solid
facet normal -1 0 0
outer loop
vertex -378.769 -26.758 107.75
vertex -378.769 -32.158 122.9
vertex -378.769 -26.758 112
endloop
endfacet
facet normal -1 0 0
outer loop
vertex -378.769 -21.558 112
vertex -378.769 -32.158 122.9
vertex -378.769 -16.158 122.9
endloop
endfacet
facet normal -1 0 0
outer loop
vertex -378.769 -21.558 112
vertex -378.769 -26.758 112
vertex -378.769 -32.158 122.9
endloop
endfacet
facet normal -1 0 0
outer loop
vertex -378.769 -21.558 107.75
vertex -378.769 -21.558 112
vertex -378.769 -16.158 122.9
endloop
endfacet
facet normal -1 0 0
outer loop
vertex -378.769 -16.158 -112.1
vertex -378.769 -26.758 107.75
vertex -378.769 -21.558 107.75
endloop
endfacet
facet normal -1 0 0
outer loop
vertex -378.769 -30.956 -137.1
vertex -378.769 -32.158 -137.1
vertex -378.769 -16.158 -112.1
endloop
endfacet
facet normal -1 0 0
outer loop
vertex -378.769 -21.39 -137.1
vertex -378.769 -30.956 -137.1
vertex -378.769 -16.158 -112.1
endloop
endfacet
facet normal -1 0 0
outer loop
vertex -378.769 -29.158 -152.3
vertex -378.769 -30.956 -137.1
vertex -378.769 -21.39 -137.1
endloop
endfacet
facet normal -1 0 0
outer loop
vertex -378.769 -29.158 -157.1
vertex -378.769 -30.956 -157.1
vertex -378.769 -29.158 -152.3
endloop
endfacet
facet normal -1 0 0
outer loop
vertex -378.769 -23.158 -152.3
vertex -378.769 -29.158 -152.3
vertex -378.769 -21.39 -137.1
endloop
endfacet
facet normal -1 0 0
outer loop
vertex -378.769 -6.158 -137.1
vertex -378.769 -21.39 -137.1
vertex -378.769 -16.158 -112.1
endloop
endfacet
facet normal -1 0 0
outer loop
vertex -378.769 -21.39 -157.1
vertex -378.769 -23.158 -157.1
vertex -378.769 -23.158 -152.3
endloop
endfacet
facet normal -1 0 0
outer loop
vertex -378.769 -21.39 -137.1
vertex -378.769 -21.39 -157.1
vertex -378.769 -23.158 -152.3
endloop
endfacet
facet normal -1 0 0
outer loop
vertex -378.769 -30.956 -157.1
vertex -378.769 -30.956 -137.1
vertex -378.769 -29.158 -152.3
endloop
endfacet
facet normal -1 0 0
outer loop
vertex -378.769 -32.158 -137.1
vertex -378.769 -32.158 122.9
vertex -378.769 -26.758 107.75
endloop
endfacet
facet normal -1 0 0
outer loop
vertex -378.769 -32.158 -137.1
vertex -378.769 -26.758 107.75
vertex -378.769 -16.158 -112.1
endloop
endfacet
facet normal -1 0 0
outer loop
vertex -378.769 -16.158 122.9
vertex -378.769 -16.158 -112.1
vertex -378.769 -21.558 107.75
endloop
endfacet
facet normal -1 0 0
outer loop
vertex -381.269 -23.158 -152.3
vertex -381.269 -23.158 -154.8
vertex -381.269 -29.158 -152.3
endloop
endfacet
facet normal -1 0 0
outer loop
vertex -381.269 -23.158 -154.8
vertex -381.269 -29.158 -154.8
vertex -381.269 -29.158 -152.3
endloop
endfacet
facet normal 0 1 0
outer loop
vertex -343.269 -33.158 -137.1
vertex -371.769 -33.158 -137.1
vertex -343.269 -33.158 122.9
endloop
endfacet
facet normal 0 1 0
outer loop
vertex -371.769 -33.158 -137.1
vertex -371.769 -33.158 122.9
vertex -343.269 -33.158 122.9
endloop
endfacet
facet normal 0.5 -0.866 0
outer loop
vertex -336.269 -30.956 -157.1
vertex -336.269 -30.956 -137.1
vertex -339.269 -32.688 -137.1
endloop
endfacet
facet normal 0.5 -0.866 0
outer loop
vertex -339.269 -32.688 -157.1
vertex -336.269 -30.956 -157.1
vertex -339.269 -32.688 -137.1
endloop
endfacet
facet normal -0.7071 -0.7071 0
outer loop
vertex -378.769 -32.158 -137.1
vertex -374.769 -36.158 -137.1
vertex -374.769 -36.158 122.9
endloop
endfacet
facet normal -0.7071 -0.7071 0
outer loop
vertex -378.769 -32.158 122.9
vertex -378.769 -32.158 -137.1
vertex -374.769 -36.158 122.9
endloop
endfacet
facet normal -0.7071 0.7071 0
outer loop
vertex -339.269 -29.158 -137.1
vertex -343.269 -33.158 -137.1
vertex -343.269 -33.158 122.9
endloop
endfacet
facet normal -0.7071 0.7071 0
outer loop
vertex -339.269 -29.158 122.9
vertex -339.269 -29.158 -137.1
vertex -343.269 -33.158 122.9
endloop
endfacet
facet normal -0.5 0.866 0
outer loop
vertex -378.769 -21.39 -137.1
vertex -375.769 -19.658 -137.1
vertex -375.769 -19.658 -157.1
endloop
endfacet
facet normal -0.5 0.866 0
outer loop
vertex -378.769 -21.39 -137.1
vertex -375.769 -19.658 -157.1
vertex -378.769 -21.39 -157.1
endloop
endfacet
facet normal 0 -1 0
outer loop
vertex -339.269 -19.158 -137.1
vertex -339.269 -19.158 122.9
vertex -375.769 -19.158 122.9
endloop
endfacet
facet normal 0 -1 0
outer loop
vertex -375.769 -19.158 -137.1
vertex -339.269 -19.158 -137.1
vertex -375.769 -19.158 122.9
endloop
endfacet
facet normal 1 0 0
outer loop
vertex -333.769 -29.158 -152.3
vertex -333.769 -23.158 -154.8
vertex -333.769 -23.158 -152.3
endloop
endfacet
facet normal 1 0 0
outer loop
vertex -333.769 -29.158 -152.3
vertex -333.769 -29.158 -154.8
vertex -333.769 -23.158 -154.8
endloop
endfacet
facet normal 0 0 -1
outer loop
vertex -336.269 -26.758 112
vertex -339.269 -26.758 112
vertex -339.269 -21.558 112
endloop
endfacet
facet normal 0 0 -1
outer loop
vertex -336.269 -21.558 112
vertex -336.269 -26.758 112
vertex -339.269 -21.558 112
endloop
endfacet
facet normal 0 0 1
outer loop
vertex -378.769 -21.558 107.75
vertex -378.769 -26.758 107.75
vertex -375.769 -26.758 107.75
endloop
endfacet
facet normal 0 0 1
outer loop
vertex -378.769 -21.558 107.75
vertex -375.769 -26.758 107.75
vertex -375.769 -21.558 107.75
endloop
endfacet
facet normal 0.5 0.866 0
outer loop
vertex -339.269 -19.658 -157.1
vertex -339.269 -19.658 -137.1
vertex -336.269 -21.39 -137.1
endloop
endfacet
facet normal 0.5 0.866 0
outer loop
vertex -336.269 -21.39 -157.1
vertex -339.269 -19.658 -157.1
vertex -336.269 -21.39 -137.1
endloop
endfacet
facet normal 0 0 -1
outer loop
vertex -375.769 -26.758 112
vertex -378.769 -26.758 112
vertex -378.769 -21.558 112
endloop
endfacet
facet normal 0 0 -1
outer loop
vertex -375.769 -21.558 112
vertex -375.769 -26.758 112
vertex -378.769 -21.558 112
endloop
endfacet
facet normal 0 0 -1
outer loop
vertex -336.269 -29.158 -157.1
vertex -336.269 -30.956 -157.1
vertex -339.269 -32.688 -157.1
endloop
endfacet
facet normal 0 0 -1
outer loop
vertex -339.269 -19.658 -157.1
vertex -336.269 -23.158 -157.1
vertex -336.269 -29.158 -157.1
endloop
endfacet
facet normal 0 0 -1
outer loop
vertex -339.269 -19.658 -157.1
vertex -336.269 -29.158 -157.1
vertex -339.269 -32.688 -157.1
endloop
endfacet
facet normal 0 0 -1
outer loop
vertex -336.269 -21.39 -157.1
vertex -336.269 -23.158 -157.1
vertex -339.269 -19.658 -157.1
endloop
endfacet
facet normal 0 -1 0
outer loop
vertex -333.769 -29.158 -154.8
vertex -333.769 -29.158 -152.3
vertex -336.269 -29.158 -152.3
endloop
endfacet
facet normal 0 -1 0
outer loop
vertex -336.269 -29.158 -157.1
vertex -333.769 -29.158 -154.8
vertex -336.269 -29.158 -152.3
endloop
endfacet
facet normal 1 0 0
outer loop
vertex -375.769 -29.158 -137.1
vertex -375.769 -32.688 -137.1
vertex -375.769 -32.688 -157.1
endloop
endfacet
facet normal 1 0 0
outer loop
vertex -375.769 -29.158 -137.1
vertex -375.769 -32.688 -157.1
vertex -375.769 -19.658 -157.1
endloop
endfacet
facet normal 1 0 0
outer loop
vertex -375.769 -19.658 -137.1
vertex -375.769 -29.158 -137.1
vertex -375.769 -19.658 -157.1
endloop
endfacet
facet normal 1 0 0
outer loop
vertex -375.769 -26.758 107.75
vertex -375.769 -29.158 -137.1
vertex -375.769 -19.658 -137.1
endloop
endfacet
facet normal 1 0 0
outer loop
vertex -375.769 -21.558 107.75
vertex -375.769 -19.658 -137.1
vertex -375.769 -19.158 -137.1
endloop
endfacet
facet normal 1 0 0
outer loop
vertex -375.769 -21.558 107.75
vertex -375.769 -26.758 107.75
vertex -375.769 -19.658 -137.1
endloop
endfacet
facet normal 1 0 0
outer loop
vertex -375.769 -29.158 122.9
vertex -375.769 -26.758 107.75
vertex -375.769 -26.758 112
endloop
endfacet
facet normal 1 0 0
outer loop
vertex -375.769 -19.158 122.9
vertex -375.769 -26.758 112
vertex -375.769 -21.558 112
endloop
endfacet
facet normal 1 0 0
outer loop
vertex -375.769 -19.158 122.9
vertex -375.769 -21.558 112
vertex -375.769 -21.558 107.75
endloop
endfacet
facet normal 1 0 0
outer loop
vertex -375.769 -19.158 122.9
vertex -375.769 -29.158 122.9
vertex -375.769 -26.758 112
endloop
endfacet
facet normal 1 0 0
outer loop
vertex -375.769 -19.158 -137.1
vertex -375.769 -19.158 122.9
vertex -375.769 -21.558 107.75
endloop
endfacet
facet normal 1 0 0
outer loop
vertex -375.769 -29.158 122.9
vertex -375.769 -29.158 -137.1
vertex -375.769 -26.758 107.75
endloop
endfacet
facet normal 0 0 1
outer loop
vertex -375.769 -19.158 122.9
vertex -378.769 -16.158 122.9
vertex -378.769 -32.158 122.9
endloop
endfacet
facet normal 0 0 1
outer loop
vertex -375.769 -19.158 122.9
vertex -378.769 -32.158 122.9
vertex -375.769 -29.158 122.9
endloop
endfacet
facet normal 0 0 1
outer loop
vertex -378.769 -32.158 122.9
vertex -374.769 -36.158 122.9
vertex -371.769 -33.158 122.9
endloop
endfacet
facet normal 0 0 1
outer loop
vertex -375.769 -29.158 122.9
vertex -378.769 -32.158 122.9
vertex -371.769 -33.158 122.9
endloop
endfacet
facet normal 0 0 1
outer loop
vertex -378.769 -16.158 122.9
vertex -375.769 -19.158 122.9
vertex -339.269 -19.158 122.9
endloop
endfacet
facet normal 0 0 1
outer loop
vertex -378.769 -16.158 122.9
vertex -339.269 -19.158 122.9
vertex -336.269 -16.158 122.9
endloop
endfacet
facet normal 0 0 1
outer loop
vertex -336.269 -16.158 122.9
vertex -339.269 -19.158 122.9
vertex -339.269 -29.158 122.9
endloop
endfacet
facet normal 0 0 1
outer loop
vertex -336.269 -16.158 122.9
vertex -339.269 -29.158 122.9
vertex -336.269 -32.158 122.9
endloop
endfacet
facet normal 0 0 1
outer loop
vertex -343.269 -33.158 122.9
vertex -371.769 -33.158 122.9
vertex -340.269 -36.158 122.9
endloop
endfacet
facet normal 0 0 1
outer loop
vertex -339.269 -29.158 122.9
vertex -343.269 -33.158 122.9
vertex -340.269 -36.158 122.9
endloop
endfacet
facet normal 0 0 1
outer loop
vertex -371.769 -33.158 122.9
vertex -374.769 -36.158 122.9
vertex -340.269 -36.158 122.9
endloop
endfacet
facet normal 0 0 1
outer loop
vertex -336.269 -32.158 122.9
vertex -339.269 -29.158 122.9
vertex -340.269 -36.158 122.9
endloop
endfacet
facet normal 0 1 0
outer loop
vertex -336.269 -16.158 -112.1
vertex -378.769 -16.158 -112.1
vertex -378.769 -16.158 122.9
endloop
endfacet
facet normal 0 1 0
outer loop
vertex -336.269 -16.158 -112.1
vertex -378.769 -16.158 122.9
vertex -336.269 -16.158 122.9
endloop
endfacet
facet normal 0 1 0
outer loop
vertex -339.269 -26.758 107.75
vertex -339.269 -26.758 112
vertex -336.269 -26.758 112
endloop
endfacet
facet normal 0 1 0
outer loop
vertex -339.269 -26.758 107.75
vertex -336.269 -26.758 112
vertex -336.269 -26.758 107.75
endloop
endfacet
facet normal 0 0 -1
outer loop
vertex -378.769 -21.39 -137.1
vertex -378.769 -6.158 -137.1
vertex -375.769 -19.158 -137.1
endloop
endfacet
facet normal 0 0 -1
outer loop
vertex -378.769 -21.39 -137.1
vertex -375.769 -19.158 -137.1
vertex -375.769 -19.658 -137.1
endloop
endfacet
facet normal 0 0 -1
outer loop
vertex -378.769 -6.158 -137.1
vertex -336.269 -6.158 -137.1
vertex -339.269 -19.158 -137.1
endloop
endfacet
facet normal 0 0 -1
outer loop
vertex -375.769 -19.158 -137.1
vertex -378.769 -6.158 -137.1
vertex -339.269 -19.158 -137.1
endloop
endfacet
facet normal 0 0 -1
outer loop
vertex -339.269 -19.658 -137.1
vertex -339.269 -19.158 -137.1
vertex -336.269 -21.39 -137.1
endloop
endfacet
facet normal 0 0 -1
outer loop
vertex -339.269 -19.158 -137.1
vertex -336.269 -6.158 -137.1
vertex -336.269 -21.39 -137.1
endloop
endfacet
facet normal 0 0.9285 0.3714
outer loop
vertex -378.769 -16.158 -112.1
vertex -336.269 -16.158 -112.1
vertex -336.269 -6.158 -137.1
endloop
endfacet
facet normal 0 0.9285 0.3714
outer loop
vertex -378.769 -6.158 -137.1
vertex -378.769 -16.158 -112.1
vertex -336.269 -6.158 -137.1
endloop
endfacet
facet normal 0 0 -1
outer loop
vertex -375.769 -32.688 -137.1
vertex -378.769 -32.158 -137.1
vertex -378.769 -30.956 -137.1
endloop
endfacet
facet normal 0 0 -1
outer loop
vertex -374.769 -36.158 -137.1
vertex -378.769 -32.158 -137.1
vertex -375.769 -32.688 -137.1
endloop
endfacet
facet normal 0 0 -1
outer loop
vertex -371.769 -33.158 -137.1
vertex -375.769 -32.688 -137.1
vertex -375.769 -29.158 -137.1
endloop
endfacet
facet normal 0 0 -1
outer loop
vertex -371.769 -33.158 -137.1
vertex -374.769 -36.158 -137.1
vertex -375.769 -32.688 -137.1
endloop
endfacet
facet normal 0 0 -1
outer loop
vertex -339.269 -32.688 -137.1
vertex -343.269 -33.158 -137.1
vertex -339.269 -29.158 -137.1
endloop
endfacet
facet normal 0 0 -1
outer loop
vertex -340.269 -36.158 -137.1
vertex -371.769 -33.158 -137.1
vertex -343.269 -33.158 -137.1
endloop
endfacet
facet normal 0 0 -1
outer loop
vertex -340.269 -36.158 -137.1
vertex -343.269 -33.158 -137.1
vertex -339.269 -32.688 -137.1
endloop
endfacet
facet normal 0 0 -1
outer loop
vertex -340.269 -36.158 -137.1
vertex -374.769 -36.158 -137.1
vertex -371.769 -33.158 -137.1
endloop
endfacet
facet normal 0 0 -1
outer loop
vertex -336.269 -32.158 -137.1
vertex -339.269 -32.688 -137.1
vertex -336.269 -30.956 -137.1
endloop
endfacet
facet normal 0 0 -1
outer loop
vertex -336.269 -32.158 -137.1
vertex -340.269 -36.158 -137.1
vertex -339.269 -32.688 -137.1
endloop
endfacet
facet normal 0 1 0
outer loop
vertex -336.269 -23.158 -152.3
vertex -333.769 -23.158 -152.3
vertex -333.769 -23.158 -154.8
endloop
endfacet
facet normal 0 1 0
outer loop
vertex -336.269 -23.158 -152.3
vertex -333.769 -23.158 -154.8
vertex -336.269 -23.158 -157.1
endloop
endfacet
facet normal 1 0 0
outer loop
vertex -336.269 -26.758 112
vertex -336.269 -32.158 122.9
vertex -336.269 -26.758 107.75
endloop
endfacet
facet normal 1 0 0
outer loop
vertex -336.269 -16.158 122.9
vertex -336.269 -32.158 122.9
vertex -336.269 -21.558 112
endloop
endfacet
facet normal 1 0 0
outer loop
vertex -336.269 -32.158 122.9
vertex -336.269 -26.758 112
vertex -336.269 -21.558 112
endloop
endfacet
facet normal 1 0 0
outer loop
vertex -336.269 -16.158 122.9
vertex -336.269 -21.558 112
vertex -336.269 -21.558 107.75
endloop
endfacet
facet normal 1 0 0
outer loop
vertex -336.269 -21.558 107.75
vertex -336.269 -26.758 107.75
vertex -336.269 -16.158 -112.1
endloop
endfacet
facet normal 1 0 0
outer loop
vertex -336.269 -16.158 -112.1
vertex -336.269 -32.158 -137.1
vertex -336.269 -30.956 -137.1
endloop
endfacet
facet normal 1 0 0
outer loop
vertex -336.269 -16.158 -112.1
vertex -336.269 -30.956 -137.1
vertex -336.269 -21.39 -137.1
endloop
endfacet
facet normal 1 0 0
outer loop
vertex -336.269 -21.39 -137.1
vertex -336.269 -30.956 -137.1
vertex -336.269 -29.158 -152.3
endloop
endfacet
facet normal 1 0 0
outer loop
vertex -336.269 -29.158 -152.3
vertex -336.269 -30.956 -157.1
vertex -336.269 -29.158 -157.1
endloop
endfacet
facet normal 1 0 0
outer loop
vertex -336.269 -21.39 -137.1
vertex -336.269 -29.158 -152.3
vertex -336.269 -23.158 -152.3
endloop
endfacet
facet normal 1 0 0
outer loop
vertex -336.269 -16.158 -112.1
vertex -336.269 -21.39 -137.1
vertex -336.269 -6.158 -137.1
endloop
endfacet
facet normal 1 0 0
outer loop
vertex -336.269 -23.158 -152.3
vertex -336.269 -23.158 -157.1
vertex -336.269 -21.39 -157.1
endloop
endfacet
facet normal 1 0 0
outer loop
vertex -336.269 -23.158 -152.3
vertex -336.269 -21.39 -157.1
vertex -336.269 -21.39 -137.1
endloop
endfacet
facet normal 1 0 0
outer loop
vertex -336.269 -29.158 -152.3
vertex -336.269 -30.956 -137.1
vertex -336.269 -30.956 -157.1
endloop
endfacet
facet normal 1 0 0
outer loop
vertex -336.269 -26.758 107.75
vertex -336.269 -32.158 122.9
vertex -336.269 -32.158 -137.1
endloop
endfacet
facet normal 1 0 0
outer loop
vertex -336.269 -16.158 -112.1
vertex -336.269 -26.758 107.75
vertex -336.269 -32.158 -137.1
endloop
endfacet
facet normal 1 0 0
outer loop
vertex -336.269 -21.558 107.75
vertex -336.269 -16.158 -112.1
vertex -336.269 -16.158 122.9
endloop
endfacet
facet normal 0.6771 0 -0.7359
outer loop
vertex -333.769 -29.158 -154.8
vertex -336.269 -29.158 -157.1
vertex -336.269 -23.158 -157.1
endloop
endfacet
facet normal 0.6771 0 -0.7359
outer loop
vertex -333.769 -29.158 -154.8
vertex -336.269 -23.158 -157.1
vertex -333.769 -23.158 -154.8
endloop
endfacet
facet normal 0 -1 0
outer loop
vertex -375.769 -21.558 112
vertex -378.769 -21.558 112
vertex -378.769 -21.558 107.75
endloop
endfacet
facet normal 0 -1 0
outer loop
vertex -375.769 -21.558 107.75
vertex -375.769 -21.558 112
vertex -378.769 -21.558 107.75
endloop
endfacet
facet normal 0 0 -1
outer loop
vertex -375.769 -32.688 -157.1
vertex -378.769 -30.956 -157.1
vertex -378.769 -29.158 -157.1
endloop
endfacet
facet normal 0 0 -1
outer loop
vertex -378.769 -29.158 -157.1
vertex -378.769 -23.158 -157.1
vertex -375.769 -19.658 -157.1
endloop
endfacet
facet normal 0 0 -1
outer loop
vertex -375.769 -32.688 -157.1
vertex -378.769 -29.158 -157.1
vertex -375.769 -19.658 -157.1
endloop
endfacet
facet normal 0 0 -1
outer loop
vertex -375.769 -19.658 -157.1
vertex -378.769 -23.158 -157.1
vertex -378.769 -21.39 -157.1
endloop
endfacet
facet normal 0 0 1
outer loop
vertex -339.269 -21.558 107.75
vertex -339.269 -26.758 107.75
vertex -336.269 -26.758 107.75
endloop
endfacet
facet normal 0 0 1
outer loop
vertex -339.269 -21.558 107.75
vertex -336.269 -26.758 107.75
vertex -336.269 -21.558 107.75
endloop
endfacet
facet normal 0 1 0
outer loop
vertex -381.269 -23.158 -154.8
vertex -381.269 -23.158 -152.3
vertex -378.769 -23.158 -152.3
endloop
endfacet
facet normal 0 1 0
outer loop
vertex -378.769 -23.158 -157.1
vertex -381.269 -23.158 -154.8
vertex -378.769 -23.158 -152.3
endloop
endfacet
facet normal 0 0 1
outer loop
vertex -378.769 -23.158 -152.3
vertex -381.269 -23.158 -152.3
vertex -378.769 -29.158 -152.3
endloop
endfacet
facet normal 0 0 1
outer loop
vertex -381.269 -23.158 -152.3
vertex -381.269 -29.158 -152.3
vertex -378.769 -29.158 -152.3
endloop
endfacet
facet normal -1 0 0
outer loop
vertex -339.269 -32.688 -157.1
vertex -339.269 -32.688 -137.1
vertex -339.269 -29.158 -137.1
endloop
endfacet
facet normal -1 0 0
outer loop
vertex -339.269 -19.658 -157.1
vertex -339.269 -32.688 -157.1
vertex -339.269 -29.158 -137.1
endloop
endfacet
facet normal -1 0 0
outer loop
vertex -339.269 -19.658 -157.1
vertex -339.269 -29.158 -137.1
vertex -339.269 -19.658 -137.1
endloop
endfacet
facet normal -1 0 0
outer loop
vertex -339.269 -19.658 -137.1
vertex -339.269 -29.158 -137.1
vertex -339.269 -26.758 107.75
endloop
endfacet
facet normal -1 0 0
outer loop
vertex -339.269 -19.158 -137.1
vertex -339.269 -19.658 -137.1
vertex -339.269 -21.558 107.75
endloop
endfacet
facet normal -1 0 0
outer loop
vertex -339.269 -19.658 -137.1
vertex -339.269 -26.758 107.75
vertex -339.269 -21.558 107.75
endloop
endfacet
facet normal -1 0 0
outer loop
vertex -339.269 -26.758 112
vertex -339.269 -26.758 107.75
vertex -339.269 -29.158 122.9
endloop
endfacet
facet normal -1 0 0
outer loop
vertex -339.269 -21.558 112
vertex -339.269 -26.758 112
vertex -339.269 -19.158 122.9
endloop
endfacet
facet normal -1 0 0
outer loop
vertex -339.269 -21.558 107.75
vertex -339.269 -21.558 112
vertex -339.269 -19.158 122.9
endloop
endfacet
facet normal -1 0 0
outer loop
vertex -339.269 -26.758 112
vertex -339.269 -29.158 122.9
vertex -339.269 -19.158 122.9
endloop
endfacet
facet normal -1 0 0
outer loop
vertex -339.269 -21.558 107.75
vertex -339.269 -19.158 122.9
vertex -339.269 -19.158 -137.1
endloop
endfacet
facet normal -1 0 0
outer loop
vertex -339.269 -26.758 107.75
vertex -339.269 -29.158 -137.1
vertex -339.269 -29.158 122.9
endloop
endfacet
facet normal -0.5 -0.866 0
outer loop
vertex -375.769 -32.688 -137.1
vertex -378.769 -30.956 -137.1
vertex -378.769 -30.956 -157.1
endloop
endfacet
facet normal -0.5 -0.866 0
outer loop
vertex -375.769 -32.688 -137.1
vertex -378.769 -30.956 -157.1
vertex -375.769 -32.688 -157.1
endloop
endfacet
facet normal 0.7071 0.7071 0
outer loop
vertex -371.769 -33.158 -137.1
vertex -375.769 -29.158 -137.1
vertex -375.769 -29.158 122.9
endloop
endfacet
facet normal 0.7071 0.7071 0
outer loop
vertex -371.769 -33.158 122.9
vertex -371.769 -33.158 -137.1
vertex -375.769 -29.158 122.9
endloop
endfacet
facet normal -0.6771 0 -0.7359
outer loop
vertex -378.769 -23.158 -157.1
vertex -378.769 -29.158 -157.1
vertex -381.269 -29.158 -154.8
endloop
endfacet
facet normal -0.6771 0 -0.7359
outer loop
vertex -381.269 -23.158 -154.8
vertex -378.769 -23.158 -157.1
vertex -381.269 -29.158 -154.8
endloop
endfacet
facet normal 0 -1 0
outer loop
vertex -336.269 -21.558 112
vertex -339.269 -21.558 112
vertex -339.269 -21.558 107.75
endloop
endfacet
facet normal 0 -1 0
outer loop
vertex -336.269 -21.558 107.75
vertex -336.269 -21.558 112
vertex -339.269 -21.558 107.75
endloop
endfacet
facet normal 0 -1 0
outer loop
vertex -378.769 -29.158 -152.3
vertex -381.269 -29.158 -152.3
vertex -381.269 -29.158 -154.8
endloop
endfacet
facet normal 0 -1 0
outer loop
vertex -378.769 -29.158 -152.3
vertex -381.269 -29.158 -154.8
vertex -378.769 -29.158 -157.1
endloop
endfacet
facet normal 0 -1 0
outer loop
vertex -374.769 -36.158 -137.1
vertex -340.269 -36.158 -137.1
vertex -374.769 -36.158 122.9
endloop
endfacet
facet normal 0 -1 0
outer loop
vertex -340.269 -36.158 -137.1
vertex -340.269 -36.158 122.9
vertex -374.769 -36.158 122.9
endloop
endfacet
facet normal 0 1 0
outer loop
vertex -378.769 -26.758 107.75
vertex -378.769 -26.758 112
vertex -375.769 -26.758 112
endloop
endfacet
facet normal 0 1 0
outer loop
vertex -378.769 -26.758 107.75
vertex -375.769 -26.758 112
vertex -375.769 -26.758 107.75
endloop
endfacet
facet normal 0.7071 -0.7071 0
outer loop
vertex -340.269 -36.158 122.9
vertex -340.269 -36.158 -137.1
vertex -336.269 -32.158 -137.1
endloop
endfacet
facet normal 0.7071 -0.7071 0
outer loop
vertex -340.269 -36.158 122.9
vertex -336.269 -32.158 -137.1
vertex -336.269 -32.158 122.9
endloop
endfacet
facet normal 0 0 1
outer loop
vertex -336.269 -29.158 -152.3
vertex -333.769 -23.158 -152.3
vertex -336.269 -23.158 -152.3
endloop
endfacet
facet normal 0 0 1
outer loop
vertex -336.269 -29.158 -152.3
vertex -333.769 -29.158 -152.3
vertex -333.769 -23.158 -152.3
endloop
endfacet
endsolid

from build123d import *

# Parameters (mm, degrees)
SKETCH135_W             = 20
SKETCH135_H             = 42.5
SKETCH135_W_2           = 14
SKETCH135_H_2           = 36.5
CHAMFER006_SIZE         = 4
PAD037_DEPTH            = 20
PAD038_DEPTH            = 3
SKETCH150_W             = 5.2
SKETCH150_H             = 4.25
POCKET048_DEPTH         = 45.001
PAD039_DEPTH            = 42.5
BODY012_ROLL_ANGLE      = 90
BODY012_PLACEMENT_ANGLE = -90


with BuildPart() as part:
    # AdditivePipe002: sweep along a path in Sketch134
    with BuildLine(Plane.XY) as additivepipe002_path:
        Line((0, 0), (0, 260))
    # Sketch135 → AdditivePipe002 (sweep)
    with BuildSketch(Plane.XZ):
        Rectangle(SKETCH135_W, SKETCH135_H)
        Rectangle(SKETCH135_W_2, SKETCH135_H_2, mode=Mode.SUBTRACT)
    sweep(path=additivepipe002_path.line)

    # Chamfer006
    chamfer006_edges = [part.edges().sort_by_distance(p)[0] for p in [
        (10, 130, 21.25),
        (10, 130, -21.25),
        (7, 130, 18.25),
        (7, 130, -18.25),
    ]]
    chamfer(chamfer006_edges, length=CHAMFER006_SIZE)

    # Sketch147 (on Face1 of AdditivePipe002) → Pad037 (new body)
    with BuildSketch(Plane.XZ):
        Polygon((-4.767949, 21.25), (4.797949, 21.25), (6.53, 18.25), (-6.5, 18.25), align=None)
    pad037 = extrude(amount=PAD037_DEPTH)

    # Sketch148 (on Face13 of Pad037) → Pad038 (join, symmetric)
    with BuildSketch(Plane(origin=(0, 0, 0), x_dir=(0, 0, 1), z_dir=(1, 0, 0))):
        Polygon((21.25, 20), (23.75, 17.7), (23.75, 15.2), (21.25, 15.2), align=None)
    pad038 = extrude(amount=PAD038_DEPTH, both=True)

    # Mirrored011: Pad038, Pad037 across Sketch148 V_Axis
    add(pad038.mirror(Plane.XY))
    add(pad037.mirror(Plane.XY))

    # Sketch150 (on Face6 of Chamfer006) → Pocket048 (cut, through all)
    with BuildSketch(Plane(origin=(0, 0, 21.25), x_dir=(-1, 0, 0), z_dir=(0, 0, 1))):
        with Locations((2, -246.975)):
            Rectangle(SKETCH150_W, SKETCH150_H)
    extrude(amount=-POCKET048_DEPTH, mode=Mode.SUBTRACT)

    # Sketch151 (on Face3 of Pocket048) → Pad039 (join)
    with BuildSketch(Plane(origin=(0, 0, -21.25), x_dir=(1, 0, 0), z_dir=(0, 0, -1))):
        Polygon((-20, 0), (-10, 0), (-10, -25), align=None)
    extrude(amount=-PAD039_DEPTH)


with BuildPart() as part_1:
    # Body012 roll: moved
    add(part.part.rotate(Axis((0, 0, 0), (1, 0, 0)), BODY012_ROLL_ANGLE))


with BuildPart() as part_2:
    # Body012 placement: moved
    add(part_1.part.moved(Location((-357.518507, -26.157783, -137.100044))).rotate(Axis((-357.518507, -26.157783, -137.100044), (0, 0, 1)), BODY012_PLACEMENT_ANGLE))


solid = part_2.part
